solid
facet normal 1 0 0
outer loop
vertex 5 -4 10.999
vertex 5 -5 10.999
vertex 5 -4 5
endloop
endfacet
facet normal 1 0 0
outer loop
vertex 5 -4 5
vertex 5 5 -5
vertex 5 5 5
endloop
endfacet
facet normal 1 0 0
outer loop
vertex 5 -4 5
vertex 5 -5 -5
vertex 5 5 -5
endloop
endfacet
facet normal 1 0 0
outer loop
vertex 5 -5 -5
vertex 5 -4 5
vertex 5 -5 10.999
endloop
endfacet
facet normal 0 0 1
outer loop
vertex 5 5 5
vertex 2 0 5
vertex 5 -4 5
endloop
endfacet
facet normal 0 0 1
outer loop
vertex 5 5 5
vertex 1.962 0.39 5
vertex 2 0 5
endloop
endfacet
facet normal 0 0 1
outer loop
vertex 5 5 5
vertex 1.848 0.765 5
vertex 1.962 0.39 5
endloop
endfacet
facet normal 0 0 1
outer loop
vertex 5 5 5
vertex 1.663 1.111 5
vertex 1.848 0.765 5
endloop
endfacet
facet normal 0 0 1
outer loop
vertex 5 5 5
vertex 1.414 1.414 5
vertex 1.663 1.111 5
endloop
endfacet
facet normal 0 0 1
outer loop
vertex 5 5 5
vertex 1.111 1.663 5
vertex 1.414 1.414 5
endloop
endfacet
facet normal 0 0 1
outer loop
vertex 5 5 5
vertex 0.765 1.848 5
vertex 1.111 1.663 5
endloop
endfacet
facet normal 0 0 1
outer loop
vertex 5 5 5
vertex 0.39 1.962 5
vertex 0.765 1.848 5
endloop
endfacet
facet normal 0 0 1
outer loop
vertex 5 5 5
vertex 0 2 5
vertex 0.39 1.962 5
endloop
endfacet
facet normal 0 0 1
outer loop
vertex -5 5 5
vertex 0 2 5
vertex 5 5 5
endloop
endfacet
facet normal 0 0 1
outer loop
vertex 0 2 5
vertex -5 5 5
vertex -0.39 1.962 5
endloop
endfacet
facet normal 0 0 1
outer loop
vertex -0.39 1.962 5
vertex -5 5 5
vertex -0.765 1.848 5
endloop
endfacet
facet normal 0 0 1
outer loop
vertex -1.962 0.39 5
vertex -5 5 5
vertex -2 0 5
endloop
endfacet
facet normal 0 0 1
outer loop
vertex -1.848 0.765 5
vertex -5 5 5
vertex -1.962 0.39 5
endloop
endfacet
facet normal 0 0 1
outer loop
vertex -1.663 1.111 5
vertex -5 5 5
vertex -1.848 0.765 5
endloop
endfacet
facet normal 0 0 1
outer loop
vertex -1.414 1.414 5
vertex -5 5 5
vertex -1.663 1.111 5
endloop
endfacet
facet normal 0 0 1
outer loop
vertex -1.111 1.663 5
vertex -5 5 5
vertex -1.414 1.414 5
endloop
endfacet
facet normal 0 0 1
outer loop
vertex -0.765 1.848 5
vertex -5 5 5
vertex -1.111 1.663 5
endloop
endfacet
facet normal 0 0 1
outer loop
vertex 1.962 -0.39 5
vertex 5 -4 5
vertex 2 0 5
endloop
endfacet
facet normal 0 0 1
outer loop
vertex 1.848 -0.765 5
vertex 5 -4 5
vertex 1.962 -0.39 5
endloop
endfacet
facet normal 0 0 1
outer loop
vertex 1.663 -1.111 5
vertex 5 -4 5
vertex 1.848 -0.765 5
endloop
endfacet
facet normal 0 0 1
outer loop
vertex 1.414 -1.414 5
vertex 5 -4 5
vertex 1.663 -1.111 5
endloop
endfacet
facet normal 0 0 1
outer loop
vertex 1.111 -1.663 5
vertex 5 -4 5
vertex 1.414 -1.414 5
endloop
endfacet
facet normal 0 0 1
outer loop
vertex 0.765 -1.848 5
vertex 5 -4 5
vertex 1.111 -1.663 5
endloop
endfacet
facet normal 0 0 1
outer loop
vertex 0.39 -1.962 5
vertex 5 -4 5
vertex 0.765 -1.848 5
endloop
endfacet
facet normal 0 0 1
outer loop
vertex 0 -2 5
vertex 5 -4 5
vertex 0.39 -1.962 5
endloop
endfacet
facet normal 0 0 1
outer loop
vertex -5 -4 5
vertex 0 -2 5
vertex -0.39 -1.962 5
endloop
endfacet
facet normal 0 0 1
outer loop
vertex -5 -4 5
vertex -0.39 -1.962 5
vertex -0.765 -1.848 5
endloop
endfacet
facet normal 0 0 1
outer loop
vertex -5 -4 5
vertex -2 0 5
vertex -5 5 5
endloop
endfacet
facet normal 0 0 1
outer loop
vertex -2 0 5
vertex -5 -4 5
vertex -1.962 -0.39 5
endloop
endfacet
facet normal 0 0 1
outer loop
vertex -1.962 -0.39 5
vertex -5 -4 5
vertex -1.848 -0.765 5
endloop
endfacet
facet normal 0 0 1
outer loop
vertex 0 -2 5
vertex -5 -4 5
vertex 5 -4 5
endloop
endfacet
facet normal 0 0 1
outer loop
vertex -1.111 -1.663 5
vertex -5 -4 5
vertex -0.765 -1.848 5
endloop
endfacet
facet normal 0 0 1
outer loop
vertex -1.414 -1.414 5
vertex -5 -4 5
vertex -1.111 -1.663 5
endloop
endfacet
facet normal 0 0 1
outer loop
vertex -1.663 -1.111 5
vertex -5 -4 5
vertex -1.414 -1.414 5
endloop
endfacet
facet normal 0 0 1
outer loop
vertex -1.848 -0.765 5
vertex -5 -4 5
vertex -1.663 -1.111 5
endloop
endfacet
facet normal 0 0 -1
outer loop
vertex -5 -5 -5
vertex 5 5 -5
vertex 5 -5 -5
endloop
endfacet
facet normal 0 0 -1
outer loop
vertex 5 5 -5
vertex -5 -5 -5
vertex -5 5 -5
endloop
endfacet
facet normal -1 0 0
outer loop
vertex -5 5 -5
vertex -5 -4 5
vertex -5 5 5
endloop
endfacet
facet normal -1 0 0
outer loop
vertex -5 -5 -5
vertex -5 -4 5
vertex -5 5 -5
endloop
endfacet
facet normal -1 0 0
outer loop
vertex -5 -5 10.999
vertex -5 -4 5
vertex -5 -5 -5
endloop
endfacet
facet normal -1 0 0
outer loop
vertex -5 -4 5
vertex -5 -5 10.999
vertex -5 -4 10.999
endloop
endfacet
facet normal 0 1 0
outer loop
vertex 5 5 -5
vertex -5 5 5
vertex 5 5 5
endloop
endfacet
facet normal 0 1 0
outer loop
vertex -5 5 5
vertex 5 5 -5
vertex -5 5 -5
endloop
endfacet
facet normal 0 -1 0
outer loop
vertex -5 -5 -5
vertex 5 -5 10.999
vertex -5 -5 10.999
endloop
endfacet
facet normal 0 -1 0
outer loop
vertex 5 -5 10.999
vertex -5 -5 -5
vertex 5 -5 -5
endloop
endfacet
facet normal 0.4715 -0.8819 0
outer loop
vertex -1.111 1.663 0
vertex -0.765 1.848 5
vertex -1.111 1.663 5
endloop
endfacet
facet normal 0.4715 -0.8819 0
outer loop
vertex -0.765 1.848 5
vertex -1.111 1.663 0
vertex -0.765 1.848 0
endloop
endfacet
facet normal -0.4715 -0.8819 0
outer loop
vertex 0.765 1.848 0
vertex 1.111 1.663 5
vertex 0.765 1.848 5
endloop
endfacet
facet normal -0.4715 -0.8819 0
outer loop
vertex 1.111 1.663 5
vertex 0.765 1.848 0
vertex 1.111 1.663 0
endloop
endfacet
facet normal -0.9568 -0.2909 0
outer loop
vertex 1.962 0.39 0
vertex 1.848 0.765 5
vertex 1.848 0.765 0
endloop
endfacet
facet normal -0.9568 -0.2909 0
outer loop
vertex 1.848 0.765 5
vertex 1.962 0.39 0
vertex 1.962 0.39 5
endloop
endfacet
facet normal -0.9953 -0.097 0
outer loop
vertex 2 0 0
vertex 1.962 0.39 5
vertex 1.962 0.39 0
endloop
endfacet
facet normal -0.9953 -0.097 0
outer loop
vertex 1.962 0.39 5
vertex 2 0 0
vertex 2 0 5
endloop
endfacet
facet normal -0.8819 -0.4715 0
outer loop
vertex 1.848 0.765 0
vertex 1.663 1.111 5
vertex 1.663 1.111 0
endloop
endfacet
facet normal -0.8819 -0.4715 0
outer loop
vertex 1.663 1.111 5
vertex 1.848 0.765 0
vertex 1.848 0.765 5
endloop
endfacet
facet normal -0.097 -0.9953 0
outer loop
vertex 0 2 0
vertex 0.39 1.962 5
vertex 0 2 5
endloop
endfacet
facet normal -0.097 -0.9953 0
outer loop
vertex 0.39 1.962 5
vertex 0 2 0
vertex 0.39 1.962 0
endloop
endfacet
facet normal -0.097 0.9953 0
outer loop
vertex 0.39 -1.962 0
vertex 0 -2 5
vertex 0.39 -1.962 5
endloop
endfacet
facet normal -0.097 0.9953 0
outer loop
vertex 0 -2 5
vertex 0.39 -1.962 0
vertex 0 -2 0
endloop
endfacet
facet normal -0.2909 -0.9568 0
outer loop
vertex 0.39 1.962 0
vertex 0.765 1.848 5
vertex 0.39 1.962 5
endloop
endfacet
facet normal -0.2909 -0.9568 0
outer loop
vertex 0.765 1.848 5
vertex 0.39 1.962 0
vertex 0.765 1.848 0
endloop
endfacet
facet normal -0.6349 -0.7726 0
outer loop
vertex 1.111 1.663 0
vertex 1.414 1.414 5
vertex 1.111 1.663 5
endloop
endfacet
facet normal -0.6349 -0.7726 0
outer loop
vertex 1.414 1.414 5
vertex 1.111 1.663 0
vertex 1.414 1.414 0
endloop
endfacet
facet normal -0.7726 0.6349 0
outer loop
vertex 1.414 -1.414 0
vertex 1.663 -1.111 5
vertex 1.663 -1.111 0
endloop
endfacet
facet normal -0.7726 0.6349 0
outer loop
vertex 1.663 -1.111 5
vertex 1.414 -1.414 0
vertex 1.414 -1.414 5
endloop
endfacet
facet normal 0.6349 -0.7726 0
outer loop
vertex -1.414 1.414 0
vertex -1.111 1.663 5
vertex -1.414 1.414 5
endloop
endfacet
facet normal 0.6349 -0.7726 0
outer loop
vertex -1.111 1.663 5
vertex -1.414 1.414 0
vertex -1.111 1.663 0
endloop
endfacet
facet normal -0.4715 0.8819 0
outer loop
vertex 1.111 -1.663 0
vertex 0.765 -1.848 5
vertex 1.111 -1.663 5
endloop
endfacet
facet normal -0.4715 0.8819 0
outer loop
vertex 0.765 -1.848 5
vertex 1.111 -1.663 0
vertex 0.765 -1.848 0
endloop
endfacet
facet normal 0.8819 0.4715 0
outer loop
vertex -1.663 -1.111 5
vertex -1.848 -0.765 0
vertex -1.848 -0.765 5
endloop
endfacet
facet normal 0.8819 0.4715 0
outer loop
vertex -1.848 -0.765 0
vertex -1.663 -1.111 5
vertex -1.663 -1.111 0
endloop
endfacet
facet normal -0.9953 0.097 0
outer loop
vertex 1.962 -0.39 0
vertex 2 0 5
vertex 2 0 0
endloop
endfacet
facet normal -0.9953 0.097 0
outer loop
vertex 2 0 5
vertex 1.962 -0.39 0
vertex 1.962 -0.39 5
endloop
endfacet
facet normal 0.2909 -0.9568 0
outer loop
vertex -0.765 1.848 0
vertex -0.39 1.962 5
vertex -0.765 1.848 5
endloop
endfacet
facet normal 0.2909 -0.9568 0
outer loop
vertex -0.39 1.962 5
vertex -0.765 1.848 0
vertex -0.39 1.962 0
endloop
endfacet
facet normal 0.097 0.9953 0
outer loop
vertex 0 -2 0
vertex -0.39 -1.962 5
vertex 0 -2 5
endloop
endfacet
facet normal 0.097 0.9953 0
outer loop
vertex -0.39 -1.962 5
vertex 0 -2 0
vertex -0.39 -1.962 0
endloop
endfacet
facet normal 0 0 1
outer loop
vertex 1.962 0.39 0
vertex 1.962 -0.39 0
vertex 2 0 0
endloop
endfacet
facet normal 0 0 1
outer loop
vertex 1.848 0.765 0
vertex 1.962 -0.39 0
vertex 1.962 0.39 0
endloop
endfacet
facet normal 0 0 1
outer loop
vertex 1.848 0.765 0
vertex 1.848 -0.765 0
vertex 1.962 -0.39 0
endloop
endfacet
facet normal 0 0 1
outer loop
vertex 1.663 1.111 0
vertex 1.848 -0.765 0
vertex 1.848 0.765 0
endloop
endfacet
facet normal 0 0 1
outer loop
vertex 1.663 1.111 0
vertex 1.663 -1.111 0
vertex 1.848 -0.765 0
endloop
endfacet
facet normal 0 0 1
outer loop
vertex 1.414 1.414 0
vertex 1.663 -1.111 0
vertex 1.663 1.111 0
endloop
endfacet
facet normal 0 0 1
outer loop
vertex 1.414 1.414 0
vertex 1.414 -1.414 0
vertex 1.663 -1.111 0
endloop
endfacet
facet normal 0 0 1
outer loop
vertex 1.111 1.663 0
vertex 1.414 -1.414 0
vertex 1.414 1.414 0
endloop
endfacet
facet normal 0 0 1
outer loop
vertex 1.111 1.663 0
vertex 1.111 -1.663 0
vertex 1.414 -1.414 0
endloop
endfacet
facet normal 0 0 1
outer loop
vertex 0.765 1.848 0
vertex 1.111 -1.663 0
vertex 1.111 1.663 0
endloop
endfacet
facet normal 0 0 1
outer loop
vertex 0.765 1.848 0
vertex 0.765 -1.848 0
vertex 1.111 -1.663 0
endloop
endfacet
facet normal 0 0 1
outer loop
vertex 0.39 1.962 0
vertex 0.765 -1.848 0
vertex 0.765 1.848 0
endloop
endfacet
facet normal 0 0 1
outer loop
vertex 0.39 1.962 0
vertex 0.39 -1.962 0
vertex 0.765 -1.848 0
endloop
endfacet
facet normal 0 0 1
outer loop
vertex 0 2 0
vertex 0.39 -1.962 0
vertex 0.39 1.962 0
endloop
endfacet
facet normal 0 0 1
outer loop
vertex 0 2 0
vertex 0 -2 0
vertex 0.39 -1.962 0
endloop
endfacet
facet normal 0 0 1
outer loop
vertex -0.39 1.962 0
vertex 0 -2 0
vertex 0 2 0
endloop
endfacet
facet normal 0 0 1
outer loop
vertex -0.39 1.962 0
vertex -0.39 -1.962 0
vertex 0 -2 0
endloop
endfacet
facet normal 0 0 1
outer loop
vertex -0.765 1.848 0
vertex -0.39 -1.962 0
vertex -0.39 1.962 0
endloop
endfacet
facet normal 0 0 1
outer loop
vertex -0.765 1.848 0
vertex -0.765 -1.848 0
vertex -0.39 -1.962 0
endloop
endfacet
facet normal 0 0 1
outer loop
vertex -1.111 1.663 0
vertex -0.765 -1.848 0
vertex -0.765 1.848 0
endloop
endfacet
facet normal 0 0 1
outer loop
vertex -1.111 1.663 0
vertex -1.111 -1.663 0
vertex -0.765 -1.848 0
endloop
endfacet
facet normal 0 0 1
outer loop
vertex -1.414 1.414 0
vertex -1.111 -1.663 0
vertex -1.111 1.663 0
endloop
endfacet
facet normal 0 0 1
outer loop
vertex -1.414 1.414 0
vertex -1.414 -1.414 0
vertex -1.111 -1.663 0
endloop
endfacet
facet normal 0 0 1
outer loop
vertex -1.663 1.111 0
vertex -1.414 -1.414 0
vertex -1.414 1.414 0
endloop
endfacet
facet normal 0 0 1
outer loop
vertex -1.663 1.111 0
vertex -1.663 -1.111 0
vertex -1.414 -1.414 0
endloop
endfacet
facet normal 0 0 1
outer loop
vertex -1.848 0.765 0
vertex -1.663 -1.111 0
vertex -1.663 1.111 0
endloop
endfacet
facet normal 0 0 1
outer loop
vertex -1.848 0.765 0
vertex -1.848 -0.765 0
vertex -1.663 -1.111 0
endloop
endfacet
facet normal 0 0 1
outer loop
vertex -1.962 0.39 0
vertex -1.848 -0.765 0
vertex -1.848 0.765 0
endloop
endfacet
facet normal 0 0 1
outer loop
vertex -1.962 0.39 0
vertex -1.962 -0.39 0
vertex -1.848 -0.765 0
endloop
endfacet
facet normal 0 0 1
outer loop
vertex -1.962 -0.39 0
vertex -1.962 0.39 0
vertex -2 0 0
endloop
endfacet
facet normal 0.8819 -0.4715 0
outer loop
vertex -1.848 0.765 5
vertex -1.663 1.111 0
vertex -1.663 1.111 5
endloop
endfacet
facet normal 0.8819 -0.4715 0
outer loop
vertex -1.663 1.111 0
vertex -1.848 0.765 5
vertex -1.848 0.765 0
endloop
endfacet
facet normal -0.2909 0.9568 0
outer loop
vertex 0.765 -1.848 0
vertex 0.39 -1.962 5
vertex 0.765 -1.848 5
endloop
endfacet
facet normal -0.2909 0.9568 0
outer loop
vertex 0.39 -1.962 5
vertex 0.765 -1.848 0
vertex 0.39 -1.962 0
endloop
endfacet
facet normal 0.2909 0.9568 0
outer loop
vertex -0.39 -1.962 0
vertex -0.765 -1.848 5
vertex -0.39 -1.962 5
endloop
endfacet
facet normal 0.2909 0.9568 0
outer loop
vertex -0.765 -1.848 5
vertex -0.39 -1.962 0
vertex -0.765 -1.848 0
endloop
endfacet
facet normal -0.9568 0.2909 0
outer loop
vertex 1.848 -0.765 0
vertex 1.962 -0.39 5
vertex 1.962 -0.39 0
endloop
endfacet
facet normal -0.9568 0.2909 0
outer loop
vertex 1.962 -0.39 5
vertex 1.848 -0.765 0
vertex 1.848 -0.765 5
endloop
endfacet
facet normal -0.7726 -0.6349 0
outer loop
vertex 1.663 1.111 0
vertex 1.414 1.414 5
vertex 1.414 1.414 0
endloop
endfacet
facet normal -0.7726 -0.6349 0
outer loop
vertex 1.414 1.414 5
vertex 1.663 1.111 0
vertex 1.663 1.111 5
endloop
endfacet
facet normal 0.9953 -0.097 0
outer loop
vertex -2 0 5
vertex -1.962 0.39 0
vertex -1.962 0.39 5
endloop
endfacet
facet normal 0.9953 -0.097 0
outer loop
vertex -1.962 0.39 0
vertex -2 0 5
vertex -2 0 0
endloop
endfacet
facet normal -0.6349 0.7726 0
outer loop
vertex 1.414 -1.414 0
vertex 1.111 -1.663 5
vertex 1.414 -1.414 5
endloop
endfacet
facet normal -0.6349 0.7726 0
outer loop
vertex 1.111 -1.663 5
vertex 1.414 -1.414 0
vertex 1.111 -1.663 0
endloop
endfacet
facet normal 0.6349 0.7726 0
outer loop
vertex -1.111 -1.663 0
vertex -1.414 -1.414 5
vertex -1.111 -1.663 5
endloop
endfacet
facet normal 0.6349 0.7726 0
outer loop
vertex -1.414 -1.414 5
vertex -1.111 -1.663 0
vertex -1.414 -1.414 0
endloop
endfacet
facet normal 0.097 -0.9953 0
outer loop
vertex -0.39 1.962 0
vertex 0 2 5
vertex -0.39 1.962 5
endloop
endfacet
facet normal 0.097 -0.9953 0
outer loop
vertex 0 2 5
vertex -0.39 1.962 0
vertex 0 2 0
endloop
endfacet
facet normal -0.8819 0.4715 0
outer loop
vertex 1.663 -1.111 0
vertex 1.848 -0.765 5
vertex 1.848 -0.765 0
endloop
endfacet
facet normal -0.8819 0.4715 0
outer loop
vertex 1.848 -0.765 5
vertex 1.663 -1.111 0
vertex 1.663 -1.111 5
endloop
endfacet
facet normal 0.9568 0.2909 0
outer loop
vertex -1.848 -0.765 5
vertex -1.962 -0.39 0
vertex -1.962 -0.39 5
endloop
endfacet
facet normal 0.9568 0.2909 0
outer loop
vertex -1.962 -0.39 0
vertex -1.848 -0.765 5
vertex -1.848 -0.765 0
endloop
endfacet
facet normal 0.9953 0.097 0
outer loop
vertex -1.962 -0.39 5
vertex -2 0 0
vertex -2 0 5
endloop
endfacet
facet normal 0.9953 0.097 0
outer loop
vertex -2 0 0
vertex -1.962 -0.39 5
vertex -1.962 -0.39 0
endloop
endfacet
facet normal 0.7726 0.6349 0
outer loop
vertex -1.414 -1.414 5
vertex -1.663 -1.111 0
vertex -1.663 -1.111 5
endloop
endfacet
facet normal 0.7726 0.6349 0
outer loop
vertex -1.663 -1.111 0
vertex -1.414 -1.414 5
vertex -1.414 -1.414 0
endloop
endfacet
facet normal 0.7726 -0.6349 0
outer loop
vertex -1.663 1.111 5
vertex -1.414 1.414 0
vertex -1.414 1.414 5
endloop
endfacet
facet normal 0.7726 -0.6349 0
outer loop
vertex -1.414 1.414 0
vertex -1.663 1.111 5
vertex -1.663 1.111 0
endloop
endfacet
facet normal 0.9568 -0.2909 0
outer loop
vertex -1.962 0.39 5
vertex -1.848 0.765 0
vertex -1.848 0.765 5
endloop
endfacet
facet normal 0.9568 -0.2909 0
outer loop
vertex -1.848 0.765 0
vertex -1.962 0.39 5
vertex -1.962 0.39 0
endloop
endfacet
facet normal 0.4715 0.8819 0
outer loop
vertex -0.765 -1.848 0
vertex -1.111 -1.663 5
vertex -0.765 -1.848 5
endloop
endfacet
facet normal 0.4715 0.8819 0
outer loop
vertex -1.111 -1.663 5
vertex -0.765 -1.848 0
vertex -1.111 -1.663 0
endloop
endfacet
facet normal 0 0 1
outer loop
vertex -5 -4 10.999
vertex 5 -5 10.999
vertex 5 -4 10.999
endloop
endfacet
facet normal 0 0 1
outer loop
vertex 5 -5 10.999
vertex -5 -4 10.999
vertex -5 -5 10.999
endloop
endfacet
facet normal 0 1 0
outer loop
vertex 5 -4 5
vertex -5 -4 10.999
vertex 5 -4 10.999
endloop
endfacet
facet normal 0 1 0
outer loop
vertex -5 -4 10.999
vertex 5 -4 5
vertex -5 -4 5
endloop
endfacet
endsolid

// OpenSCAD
$fa = 1;
$fs = 0.4;

diorama_height = 10;    // Height at which the diorama should be placed in cm

side_length = 10;       // Side length of the base plate in cm
base_support = 10;      // Length of base plate bracket minus thickness of covers in cm
base_thickness = 6;     // Height of base plate in cm

cover_thickness = 1;    // Thickness of cover material

drilling_depth = diorama_height/4;

difference() {
    cube(size=[side_length, 10, diorama_height], center=true);
    translate([0, 0, drilling_depth]) {
        cylinder(r=2, h=diorama_height/2, center=true);
    }
}


translate([0, -(base_support/2 - cover_thickness/2), diorama_height/2 + base_thickness/2 - 0.001]) {
    cube(size=[side_length, cover_thickness, base_thickness], center=true);
}
